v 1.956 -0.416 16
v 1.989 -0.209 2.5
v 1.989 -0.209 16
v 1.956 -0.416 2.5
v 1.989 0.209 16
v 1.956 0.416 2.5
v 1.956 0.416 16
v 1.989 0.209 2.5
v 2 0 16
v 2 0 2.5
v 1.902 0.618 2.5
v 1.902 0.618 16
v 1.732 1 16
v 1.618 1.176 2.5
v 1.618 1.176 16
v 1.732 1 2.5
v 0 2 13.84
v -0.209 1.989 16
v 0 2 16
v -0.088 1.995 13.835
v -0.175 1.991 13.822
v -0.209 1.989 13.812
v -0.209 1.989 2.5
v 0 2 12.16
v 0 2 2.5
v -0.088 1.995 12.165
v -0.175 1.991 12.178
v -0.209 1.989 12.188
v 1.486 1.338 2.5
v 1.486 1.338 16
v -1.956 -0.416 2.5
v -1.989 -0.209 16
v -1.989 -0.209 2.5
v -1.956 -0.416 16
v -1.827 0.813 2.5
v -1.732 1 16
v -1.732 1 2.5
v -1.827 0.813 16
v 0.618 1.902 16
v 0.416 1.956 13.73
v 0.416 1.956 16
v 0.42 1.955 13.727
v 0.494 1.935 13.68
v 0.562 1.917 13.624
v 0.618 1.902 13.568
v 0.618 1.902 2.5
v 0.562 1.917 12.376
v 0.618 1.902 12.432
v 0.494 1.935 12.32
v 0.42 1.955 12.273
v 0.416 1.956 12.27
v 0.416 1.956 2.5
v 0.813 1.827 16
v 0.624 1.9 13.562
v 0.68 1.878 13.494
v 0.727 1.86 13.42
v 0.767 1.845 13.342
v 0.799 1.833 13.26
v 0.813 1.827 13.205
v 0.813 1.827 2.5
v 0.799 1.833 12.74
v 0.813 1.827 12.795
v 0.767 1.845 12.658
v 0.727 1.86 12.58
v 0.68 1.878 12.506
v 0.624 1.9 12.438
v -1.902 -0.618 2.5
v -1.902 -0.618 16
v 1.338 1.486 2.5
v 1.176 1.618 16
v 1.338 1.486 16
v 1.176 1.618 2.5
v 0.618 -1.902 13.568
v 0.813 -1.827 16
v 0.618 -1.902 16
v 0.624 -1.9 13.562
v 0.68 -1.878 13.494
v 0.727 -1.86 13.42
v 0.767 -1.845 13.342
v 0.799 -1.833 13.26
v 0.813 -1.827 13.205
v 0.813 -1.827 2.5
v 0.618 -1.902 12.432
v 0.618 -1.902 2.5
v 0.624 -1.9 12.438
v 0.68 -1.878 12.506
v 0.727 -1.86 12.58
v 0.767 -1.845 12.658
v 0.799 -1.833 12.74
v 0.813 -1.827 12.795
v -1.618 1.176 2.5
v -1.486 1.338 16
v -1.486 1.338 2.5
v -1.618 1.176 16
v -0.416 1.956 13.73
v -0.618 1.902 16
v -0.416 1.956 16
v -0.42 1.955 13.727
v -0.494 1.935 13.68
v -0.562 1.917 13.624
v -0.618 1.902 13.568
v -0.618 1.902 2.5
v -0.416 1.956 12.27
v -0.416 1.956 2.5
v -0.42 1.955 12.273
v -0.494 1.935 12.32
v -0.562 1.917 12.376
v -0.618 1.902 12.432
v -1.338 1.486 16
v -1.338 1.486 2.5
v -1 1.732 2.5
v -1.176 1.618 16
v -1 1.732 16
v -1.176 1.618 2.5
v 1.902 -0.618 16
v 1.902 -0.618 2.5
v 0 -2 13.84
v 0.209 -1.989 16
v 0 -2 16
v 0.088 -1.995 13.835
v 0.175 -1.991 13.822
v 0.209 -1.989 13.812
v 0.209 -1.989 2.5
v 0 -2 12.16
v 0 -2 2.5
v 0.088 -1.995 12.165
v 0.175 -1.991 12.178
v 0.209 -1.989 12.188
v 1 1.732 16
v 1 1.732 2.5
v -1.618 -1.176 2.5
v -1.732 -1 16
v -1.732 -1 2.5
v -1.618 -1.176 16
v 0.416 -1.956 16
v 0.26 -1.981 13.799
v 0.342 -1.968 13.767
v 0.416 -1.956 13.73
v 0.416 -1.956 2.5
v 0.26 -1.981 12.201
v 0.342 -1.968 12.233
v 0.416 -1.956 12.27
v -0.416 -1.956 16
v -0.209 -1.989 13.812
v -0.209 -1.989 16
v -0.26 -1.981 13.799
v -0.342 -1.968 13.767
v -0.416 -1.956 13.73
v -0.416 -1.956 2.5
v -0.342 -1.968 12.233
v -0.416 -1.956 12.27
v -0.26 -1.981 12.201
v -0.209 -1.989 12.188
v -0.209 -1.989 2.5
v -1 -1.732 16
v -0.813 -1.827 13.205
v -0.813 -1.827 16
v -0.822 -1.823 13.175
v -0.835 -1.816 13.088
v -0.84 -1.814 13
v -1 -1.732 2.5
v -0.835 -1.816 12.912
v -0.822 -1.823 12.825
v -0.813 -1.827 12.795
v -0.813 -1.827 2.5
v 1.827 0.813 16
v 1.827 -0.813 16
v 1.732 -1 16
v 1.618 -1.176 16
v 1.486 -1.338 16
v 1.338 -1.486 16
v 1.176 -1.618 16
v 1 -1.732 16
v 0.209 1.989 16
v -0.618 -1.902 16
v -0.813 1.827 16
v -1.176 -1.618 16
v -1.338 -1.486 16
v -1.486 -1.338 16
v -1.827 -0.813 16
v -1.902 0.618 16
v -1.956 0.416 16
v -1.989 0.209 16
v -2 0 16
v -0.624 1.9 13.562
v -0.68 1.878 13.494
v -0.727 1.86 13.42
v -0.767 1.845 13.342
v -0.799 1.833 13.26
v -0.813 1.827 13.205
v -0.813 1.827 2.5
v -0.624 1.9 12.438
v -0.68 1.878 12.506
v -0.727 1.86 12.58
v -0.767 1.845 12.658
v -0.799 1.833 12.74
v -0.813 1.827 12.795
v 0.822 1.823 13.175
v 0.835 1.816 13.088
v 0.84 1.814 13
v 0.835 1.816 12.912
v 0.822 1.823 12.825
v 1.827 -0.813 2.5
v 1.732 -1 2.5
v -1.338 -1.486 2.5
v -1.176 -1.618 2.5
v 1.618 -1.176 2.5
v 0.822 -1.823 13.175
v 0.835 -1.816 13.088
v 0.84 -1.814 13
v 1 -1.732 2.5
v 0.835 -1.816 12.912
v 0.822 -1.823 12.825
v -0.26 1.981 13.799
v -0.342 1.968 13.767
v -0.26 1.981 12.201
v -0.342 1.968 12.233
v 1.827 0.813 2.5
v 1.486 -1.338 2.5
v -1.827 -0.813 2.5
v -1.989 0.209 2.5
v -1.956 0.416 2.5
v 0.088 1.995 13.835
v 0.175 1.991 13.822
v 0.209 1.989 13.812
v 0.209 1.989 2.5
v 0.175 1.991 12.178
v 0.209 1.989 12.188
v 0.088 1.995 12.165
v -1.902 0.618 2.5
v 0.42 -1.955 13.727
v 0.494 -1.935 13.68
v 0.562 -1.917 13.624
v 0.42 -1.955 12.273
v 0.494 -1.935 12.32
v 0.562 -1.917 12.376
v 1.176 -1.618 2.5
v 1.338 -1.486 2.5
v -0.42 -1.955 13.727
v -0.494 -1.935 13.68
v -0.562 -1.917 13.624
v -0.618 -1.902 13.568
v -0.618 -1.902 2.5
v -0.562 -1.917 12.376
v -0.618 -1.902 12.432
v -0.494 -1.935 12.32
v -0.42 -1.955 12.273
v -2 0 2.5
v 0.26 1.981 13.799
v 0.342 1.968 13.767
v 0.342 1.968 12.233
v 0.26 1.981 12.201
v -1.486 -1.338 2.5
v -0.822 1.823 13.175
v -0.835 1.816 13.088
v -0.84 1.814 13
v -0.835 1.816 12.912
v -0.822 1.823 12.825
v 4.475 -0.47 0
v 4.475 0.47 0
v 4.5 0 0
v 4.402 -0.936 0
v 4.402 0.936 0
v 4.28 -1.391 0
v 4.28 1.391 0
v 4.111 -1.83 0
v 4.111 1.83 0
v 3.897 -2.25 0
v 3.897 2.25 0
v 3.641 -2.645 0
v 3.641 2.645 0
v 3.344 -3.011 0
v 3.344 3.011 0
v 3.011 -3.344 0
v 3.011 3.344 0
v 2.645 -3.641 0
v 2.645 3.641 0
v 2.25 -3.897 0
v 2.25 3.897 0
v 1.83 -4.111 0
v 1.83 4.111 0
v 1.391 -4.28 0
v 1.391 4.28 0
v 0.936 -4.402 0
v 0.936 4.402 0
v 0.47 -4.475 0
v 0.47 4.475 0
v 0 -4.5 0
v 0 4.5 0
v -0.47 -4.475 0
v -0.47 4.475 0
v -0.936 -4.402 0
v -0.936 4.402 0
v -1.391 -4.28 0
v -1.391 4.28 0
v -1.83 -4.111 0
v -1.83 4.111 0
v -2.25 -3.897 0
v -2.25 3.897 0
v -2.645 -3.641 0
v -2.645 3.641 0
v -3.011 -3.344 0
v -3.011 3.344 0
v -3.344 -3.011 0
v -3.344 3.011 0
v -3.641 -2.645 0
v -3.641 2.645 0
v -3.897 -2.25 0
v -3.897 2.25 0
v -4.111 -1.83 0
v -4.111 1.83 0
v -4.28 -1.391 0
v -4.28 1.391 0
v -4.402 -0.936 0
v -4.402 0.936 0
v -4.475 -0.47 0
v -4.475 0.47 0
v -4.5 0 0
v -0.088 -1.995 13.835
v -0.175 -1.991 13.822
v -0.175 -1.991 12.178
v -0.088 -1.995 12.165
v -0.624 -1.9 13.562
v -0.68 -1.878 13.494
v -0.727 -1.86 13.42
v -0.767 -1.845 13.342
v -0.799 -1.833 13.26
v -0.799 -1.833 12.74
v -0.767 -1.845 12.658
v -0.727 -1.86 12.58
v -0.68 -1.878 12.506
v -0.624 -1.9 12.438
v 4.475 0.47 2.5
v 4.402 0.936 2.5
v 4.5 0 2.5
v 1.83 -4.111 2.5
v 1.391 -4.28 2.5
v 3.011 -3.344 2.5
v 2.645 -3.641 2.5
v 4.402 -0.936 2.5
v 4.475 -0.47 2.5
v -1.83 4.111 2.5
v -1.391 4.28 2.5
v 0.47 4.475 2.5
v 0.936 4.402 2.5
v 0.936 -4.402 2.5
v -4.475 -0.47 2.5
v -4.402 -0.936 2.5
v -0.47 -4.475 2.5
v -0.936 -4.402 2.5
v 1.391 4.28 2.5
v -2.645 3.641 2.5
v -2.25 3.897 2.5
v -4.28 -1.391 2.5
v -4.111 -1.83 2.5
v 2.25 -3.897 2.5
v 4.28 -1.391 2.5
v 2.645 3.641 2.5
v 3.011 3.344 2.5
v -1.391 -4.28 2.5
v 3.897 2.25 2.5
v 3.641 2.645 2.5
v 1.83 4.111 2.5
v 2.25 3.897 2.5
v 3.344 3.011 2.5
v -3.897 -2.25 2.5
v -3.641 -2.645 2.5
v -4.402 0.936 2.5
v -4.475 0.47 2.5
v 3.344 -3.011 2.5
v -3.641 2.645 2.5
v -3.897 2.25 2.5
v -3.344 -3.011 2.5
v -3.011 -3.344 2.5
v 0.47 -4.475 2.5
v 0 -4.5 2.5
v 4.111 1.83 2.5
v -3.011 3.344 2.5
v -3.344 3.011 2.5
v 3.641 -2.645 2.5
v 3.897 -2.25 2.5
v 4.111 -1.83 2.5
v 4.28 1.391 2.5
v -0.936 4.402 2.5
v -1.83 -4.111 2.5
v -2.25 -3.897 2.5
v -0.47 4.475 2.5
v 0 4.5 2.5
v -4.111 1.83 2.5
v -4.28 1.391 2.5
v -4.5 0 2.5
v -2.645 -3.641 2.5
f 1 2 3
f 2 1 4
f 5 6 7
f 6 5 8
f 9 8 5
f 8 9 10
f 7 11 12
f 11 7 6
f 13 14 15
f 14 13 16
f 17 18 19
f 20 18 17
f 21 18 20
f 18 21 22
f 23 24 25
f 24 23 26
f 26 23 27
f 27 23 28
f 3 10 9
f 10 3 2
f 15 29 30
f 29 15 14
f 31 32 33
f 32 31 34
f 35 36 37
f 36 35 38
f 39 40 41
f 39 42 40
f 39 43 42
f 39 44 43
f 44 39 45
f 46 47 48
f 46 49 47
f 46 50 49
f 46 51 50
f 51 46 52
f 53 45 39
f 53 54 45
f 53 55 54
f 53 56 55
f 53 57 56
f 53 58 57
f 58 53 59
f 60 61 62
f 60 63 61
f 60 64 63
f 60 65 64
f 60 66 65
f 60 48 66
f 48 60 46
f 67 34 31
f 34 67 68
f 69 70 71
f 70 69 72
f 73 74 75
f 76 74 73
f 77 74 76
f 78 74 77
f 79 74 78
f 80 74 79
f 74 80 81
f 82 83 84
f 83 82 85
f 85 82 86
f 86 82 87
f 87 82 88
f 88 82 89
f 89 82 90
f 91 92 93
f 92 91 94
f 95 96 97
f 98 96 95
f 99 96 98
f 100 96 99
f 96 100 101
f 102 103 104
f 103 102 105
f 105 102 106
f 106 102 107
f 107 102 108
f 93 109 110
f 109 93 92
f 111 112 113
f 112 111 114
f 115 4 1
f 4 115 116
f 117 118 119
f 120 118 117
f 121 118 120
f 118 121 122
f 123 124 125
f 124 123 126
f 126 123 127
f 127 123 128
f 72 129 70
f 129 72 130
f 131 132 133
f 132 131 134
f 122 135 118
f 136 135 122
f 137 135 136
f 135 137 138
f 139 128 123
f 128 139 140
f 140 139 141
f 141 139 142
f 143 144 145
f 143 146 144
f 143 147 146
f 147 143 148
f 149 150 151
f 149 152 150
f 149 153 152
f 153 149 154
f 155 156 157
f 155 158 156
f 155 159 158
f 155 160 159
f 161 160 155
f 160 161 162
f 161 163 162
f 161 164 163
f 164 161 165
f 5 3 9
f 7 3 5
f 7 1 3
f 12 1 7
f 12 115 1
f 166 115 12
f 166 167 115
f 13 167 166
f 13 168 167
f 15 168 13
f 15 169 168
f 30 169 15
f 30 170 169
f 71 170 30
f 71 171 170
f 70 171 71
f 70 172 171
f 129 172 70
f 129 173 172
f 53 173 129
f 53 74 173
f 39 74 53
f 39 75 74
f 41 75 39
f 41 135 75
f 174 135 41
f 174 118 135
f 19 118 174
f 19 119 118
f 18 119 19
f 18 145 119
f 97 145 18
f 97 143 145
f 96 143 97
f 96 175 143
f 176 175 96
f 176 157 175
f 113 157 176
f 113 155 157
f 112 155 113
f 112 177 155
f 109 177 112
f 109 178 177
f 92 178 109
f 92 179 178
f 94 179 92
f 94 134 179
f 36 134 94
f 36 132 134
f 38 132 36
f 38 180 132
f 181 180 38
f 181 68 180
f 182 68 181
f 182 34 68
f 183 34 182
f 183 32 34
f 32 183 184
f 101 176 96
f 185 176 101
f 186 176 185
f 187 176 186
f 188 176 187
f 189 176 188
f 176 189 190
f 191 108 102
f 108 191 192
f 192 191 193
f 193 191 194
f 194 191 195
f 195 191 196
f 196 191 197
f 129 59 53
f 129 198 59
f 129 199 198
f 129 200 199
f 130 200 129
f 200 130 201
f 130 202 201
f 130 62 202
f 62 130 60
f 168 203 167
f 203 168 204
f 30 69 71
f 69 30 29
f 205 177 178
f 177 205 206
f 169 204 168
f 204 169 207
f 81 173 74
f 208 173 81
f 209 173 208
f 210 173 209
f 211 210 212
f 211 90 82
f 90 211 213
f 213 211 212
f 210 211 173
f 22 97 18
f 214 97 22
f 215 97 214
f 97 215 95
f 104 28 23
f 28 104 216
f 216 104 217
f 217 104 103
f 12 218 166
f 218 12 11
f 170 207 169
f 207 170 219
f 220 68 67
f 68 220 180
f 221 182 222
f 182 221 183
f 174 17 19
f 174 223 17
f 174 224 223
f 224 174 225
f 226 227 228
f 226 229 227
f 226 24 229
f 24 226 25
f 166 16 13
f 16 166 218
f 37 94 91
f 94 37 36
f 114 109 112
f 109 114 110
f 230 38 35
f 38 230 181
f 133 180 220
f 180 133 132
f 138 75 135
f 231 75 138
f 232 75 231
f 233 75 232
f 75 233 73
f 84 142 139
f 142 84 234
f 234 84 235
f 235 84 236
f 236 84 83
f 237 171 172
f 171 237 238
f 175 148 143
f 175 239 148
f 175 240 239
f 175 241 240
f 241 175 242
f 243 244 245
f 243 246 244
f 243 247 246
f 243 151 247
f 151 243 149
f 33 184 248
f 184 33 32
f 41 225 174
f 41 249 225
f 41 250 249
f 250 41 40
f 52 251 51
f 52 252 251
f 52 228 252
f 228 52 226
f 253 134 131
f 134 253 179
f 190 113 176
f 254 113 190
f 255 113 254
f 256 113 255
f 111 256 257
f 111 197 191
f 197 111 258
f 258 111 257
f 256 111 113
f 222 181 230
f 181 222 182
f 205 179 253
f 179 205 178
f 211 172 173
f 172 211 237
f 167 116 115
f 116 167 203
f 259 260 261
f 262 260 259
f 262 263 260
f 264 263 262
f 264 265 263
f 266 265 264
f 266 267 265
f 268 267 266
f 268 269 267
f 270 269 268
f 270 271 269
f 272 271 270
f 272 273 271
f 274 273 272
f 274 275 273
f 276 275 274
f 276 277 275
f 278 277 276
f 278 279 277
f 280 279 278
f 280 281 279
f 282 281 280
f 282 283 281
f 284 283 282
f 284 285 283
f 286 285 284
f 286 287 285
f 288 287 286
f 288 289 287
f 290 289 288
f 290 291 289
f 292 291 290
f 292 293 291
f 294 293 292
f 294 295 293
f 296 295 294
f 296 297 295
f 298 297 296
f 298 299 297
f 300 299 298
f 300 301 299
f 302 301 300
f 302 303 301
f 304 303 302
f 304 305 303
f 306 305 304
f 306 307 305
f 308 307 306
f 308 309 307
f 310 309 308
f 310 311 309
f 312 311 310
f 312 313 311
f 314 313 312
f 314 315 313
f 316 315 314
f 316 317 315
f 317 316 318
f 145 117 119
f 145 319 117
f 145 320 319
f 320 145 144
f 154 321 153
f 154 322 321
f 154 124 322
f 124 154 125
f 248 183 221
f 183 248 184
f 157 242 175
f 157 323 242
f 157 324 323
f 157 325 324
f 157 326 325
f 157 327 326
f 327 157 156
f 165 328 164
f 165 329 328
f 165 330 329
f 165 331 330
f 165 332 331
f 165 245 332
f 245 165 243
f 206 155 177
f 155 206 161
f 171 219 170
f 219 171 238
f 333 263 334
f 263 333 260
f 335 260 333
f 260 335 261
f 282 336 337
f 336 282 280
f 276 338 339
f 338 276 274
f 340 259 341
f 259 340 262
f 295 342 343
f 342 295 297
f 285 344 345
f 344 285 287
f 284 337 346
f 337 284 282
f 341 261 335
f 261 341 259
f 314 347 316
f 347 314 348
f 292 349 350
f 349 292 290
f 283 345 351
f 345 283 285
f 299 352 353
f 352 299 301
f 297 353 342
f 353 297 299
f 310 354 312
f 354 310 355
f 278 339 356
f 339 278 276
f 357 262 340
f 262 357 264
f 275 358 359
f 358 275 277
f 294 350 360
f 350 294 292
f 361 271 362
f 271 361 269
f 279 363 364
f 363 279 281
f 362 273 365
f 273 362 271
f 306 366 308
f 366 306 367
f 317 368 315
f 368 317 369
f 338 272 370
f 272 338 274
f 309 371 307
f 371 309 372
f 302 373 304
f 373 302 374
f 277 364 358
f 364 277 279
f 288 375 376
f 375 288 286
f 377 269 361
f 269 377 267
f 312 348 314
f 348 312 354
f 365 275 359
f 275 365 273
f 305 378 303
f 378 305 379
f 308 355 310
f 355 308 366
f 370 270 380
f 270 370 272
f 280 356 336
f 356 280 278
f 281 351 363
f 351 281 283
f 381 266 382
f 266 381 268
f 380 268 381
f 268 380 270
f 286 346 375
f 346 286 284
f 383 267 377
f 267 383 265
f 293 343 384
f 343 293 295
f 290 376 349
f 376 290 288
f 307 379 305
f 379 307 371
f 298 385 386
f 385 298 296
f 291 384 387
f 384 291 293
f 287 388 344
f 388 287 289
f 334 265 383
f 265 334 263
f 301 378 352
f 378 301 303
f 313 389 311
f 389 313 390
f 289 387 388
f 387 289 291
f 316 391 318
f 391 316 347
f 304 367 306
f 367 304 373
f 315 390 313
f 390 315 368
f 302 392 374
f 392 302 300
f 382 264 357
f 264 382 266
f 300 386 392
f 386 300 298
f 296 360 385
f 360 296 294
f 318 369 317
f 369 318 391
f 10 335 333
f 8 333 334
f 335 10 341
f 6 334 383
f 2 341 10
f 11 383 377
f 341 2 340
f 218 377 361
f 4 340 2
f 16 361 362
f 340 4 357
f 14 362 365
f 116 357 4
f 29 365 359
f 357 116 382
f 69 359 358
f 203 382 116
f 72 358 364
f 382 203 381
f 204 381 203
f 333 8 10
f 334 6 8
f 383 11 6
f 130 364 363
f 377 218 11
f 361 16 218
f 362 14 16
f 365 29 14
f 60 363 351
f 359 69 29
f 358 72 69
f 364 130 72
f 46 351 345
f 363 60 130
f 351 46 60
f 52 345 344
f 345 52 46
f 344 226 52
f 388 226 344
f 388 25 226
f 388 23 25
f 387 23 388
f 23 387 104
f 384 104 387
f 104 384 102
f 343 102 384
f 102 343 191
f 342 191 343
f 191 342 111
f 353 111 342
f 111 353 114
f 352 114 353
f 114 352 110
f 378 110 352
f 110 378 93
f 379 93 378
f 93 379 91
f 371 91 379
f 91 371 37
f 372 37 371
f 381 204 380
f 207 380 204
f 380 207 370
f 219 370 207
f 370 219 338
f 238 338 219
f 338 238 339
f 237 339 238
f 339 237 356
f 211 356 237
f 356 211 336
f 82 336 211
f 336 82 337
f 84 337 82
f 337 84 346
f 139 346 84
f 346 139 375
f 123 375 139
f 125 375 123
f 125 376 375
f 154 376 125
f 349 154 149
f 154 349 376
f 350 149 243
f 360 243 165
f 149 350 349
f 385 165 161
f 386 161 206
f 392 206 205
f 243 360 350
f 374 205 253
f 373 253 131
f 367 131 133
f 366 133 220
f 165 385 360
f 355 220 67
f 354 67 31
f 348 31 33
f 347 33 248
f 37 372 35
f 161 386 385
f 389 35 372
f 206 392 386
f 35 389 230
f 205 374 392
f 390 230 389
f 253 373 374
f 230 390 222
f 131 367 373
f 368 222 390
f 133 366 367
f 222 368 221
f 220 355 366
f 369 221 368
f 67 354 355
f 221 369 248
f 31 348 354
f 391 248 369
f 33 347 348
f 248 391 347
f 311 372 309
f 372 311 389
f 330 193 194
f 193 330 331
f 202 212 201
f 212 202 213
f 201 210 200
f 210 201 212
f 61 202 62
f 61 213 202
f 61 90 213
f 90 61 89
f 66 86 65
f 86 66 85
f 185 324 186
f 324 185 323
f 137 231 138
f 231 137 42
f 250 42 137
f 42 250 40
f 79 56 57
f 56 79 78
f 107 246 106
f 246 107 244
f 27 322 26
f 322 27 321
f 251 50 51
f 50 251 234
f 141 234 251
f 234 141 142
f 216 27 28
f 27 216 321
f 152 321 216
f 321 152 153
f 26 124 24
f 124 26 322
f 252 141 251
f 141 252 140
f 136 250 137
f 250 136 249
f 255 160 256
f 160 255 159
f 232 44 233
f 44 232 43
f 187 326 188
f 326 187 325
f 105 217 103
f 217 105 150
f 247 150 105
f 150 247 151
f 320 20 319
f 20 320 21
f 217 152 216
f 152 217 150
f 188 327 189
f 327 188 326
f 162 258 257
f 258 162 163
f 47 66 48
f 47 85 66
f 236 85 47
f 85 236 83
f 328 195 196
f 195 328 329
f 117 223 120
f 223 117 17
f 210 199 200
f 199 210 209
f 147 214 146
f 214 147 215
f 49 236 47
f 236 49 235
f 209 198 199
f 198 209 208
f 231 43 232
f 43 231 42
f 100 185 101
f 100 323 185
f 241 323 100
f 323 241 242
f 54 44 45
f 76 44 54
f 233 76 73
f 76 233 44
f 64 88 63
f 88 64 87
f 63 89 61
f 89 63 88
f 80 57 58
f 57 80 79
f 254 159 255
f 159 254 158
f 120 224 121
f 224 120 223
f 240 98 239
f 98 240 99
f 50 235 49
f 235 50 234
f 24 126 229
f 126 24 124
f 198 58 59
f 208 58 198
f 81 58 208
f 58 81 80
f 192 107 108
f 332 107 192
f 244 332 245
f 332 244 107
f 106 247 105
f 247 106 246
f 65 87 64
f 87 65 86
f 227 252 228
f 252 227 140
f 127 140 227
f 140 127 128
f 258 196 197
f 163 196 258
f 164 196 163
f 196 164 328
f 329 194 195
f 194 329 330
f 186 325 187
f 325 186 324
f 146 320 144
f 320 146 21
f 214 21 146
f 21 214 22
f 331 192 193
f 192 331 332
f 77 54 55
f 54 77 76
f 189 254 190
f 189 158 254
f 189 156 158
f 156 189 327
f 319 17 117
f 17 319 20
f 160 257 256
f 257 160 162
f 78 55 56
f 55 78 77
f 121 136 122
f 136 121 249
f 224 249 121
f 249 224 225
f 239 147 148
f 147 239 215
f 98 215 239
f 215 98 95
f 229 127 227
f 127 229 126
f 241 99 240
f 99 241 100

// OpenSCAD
// Clevis pin with cross-hole.
$fn = 60;
eps = 0.02;
pin_d = 4;
pin_l = 16;
head_d = pin_d + 5;
difference() {
    union() { cylinder(d=pin_d,h=pin_l); cylinder(d=head_d,h=2.5); }
    translate([0,-pin_d-eps,pin_l-3]) rotate([-90,0,0]) cylinder(d=pin_d*0.42,h=2*pin_d+2*eps);
}
